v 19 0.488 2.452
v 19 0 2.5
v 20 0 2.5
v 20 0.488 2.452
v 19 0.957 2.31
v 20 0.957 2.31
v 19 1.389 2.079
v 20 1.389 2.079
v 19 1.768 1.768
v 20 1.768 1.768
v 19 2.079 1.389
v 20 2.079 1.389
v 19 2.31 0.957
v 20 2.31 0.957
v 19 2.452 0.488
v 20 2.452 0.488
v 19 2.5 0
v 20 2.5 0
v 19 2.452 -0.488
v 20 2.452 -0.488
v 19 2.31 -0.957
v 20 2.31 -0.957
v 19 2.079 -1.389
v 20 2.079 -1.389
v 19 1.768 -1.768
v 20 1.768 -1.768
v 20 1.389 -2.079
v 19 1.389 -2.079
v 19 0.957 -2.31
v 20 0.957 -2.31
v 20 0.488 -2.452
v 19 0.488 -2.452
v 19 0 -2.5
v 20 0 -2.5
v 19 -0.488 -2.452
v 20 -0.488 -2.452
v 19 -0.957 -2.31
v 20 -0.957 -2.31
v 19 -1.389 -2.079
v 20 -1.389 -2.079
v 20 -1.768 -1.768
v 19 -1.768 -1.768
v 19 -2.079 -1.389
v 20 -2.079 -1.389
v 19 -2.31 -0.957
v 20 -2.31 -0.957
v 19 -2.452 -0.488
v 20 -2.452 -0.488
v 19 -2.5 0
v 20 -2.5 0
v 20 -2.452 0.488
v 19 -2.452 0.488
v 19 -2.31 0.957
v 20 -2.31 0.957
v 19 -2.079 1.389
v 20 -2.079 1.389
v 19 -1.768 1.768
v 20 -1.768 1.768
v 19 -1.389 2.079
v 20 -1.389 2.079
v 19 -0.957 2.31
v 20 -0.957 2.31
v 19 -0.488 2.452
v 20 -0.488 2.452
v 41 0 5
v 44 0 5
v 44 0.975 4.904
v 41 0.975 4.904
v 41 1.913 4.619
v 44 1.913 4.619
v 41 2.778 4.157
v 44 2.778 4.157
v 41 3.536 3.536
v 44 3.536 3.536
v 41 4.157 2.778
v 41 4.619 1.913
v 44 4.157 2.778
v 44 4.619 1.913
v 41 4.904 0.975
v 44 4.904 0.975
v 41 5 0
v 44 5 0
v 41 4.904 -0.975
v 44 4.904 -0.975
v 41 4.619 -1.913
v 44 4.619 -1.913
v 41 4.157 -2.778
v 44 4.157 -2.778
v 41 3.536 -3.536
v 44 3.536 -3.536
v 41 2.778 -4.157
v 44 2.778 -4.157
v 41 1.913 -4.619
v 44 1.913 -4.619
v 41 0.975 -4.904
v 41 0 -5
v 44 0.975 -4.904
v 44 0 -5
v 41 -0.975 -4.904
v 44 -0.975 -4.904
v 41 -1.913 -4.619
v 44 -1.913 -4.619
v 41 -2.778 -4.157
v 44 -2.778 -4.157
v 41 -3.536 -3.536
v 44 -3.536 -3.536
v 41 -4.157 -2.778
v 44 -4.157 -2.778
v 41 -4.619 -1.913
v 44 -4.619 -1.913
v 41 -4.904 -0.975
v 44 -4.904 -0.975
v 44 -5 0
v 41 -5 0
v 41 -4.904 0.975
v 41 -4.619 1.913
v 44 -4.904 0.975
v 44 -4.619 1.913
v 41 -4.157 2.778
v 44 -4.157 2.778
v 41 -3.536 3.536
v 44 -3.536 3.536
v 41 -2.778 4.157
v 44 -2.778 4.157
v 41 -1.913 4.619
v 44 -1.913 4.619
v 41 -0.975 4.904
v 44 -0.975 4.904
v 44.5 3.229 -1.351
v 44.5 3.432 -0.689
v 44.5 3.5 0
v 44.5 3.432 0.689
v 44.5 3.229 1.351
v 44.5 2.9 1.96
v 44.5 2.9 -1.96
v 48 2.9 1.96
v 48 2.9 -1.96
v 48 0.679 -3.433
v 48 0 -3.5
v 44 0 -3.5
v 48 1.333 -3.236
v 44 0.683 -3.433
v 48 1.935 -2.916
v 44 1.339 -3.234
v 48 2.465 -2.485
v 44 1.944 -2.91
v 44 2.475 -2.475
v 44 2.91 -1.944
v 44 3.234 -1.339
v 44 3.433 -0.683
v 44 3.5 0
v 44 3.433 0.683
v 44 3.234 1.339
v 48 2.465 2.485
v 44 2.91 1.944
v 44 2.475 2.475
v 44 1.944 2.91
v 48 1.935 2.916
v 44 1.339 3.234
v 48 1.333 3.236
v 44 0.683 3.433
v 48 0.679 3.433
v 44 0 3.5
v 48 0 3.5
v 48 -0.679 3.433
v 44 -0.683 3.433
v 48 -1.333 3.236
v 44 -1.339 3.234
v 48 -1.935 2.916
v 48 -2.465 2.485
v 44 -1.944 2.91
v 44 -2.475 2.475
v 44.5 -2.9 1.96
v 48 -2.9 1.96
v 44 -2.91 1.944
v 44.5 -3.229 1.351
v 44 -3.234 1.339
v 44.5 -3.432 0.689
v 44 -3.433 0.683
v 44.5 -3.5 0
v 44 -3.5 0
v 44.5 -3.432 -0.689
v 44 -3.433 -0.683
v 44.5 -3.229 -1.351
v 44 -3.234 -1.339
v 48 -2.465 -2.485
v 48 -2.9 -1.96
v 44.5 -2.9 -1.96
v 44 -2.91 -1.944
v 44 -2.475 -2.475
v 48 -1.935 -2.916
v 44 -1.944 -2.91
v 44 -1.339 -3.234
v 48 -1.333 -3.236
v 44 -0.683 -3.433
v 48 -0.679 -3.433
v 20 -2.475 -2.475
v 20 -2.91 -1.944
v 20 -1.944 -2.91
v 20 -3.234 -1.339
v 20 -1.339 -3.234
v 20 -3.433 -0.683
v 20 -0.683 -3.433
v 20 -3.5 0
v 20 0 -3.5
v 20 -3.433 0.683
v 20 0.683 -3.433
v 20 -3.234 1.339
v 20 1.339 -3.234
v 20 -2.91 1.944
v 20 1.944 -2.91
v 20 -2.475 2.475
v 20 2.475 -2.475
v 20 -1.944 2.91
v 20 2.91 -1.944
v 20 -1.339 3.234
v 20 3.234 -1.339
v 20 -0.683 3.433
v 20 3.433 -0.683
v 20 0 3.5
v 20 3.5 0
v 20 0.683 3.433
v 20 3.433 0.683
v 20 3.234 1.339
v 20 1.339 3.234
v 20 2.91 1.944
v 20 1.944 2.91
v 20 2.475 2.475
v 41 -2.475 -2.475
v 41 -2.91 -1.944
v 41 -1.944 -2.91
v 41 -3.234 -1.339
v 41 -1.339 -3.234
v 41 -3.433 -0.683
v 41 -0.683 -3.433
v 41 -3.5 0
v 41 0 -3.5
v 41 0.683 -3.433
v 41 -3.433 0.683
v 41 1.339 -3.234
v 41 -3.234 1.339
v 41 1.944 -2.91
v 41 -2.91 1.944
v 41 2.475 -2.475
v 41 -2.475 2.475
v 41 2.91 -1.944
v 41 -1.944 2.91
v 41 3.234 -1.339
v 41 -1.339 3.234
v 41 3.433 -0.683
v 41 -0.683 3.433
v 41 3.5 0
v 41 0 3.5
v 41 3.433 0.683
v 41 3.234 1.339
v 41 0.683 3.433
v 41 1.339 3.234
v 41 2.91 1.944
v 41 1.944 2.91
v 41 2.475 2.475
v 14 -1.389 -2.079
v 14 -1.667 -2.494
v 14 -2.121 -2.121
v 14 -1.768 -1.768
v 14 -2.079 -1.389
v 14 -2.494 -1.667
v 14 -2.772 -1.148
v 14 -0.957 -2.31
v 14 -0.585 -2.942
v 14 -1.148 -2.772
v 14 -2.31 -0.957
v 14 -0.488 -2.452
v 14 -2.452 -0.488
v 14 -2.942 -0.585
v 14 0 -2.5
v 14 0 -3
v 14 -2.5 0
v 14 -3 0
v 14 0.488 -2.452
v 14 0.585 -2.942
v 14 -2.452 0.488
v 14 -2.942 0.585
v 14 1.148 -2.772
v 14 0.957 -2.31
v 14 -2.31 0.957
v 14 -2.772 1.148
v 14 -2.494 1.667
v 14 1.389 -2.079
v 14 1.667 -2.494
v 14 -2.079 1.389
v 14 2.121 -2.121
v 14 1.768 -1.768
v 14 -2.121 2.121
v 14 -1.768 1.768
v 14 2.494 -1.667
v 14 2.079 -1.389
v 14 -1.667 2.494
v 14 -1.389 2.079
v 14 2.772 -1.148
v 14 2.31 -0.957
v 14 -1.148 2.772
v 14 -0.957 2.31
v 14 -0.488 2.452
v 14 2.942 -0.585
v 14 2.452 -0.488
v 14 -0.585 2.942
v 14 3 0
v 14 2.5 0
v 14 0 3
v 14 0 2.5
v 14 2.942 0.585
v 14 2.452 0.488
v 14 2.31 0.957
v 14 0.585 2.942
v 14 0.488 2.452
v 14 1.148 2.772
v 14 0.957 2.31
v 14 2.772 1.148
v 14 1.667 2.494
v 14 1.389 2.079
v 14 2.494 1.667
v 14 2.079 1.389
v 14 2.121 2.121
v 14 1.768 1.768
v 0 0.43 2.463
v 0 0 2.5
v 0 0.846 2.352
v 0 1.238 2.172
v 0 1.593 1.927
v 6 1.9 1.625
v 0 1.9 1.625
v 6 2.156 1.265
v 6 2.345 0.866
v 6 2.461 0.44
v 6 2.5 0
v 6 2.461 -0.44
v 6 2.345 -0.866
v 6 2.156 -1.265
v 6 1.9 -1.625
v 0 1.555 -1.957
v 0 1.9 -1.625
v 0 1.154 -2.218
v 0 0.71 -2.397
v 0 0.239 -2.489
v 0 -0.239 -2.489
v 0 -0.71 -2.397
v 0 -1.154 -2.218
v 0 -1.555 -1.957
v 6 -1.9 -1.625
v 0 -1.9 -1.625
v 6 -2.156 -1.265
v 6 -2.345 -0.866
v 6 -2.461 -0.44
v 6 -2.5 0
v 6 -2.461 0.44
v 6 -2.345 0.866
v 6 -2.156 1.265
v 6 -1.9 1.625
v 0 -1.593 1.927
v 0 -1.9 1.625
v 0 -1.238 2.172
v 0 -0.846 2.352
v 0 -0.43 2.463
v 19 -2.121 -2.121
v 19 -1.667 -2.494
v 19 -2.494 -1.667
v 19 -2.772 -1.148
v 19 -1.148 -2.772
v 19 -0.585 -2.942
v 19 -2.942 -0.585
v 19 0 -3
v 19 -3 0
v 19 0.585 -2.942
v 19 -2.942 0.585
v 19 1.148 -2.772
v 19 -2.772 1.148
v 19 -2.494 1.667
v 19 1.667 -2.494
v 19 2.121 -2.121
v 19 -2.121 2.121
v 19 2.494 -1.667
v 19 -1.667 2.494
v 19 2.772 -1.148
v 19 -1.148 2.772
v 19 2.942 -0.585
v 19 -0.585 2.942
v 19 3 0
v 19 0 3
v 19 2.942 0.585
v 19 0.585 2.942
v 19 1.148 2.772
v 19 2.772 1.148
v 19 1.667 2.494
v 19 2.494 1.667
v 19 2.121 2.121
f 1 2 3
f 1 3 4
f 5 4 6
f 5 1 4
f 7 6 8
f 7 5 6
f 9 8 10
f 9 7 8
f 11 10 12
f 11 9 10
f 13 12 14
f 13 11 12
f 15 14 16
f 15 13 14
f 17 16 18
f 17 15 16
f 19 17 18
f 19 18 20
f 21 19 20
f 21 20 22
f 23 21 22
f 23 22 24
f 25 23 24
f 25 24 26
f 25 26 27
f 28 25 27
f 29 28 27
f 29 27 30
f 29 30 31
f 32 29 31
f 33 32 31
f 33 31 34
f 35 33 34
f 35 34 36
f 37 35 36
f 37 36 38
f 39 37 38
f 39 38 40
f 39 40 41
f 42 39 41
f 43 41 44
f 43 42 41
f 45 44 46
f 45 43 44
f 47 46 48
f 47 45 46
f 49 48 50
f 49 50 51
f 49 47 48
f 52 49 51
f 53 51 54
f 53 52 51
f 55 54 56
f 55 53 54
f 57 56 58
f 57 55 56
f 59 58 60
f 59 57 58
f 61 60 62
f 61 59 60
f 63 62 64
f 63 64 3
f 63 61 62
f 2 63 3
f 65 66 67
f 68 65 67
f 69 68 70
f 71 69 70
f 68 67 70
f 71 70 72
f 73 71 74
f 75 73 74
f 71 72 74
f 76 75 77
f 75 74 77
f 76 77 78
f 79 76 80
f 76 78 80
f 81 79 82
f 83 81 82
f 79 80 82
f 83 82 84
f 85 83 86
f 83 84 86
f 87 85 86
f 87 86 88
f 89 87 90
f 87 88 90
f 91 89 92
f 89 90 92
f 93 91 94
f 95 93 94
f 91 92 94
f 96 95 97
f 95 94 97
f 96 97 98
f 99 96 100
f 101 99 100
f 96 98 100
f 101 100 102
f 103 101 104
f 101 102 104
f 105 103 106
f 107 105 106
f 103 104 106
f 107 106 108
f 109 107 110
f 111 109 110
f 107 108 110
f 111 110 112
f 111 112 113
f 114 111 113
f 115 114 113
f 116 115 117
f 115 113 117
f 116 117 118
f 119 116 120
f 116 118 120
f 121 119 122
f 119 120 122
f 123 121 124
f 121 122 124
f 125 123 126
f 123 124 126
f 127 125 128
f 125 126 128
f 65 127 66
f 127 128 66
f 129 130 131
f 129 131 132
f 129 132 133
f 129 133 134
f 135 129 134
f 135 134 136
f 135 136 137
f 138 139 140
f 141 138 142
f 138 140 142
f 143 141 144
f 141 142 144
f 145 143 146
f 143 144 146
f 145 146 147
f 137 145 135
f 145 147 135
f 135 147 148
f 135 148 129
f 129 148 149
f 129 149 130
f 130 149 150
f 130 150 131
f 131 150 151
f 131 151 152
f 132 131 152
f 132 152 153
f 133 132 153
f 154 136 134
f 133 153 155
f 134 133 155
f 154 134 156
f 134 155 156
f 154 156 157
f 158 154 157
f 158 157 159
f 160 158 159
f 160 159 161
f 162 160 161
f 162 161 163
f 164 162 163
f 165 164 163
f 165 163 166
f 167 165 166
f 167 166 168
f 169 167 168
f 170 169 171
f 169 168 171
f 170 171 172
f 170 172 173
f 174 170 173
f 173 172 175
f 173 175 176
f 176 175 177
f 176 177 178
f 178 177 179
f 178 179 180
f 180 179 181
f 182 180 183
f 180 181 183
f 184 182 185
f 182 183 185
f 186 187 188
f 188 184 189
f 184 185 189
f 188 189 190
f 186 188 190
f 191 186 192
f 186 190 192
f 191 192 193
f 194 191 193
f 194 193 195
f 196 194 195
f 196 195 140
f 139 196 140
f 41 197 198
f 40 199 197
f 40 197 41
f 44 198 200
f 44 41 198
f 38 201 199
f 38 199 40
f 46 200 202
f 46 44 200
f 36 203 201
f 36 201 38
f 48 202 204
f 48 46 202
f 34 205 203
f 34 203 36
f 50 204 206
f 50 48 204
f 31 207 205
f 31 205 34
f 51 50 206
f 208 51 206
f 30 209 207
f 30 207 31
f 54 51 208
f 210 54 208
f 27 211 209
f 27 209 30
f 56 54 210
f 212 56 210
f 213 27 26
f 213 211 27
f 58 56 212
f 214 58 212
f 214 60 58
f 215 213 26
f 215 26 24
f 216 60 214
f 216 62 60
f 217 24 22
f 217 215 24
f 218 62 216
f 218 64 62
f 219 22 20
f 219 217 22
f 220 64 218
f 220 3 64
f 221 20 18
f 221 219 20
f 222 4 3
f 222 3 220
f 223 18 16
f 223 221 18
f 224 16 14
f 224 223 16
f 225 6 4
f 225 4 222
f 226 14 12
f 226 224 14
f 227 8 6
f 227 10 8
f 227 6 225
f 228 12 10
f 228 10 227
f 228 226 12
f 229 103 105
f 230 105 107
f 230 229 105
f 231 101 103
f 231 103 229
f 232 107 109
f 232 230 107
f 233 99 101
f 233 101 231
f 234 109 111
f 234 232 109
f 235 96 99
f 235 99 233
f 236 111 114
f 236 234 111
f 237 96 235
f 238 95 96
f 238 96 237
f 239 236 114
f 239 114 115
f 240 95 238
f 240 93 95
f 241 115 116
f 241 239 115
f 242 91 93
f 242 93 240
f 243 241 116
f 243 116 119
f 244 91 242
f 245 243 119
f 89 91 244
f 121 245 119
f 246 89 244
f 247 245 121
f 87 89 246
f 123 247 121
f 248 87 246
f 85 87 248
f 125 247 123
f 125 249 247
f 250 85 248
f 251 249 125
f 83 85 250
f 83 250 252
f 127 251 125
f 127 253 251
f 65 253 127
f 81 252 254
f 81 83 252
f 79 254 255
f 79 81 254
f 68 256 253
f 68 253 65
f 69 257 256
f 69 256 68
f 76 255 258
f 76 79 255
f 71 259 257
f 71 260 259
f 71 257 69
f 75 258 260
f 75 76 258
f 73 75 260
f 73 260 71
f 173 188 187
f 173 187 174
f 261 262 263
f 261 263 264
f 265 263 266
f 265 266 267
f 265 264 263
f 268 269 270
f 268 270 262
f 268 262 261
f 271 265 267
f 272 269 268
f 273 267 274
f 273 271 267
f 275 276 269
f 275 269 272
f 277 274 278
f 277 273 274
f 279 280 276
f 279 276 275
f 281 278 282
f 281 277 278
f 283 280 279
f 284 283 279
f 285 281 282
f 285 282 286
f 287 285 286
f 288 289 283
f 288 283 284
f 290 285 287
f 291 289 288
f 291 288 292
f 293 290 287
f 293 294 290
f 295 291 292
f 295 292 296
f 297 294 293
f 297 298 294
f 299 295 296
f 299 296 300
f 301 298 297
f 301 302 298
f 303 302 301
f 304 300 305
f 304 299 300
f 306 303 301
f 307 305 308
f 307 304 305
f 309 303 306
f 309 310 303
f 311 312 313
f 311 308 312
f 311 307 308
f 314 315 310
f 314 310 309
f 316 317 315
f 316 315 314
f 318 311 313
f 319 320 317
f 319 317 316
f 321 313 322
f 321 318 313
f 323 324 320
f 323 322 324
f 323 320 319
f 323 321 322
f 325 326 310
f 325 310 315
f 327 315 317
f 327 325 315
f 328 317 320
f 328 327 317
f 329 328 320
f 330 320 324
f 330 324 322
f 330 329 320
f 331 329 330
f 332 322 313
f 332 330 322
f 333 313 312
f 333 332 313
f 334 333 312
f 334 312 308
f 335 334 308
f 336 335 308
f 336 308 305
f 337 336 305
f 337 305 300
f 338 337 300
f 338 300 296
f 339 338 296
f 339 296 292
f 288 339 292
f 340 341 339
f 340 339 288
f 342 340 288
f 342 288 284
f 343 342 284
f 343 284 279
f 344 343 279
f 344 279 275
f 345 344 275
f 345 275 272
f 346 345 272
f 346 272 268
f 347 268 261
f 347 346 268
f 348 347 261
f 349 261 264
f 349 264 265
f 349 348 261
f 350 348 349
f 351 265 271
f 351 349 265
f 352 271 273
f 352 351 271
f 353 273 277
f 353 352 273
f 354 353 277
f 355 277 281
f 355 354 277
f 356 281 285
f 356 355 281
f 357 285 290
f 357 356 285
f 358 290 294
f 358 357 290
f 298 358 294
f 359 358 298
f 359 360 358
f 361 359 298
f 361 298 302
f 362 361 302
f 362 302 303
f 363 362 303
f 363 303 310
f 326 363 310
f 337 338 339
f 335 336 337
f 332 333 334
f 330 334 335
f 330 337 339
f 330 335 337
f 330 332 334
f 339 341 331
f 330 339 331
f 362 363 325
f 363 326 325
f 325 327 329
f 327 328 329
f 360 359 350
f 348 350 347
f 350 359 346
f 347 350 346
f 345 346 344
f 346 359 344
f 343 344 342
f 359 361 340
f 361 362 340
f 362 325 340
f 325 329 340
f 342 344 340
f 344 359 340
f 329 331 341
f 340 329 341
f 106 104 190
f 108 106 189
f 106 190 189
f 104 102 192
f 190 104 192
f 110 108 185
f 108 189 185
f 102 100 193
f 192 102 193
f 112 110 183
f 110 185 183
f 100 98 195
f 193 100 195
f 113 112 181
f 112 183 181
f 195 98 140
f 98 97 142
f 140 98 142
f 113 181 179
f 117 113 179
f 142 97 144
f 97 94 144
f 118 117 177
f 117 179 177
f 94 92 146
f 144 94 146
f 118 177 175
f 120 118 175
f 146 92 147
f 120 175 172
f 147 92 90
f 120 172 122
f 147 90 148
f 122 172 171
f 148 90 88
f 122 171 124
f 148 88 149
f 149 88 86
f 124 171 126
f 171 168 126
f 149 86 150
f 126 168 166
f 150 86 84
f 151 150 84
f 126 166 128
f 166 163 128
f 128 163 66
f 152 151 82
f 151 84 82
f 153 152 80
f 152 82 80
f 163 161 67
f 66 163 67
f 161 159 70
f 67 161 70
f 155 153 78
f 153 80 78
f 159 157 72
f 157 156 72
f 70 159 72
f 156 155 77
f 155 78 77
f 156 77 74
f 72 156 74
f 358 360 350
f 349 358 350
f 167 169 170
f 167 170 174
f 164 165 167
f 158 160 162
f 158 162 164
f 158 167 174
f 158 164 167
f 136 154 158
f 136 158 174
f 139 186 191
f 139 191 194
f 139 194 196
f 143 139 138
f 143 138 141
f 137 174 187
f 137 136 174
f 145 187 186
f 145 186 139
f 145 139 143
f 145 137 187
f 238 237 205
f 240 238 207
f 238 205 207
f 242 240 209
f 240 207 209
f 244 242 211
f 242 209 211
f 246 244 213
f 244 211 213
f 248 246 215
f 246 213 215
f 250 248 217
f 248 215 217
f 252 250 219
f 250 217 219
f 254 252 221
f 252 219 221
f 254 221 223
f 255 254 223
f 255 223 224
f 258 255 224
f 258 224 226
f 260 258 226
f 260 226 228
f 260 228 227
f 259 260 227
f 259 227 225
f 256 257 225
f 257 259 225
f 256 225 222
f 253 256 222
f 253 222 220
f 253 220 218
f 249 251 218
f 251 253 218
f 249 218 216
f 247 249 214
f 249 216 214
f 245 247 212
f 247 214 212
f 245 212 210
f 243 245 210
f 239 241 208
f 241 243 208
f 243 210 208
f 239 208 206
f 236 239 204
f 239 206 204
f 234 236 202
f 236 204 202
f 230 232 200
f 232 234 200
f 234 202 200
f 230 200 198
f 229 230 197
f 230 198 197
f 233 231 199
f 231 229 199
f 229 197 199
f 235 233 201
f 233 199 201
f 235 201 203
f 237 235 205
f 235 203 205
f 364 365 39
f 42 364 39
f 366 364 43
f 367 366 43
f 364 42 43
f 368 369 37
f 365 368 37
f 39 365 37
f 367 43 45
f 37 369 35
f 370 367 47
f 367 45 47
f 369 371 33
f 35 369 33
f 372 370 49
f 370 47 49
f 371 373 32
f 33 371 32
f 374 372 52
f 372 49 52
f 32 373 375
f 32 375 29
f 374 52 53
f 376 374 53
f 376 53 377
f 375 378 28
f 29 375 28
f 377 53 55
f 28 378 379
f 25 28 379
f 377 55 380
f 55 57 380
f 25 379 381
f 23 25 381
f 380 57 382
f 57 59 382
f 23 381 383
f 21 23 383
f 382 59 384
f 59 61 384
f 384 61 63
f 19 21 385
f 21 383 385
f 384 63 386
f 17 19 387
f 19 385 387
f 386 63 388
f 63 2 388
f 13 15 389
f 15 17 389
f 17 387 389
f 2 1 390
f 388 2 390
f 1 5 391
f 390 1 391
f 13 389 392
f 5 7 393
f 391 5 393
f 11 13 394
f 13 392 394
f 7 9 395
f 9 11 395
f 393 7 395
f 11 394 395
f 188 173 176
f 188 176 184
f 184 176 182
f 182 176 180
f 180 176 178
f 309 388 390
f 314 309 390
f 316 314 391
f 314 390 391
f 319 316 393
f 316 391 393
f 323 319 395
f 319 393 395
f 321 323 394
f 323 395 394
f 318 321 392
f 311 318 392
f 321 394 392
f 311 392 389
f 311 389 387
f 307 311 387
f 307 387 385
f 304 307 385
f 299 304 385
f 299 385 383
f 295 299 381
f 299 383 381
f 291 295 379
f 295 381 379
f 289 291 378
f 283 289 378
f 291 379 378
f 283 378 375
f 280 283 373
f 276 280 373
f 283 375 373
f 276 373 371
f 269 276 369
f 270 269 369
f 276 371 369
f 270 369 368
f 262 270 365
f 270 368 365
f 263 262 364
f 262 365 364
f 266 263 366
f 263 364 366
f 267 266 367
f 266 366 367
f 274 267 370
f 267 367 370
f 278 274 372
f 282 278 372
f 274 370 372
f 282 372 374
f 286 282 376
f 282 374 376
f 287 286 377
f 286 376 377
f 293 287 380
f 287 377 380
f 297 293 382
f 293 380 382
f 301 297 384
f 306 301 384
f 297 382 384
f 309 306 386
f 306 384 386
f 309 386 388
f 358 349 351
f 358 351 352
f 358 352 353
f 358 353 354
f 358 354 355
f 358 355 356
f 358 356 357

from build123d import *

# Parameters (mm, degrees)
SKETCH1_R           = 3.5
BOSS_EXTRUDE1_DEPTH = 50
BOSS_EXTRUDE2_START = 6
SKETCH2_R           = 5
BOSS_EXTRUDE2_DEPTH = 3
SKETCH5_R           = 3.5
SKETCH5_R_2         = 2.5
CUT_EXTRUDE2_DEPTH  = 20
BOSS_EXTRUDE3_START = 22
SKETCH3_R           = 3
BOSS_EXTRUDE3_DEPTH = 5
CUT_EXTRUDE3_START  = -5.5
CUT_EXTRUDE3_DEPTH  = 5.5
CUT_EXTRUDE4_START  = -2
CUT_EXTRUDE4_DEPTH  = 2
CUT_EXTRUDE5_DEPTH  = 6


with BuildPart() as part:
    # Sketch1 → Boss-Extrude1 (new body)
    with BuildSketch(Plane(origin=(0, 0, 0), x_dir=(0, 0, -1), z_dir=(1, 0, 0))):
        Circle(SKETCH1_R)
    extrude(amount=BOSS_EXTRUDE1_DEPTH)

    # Sketch2 → Boss-Extrude2 (add)
    with BuildSketch(Plane.ZY.offset(-50).offset(BOSS_EXTRUDE2_START)):
        Circle(SKETCH2_R)
    extrude(amount=BOSS_EXTRUDE2_DEPTH)

    # Sketch5 → Cut-Extrude2 (cut)
    with BuildSketch(Plane.ZY):
        Circle(SKETCH5_R)
        Circle(SKETCH5_R_2, mode=Mode.SUBTRACT)
    extrude(amount=-CUT_EXTRUDE2_DEPTH, mode=Mode.SUBTRACT)

    # Sketch3 → Boss-Extrude3 (add)
    with BuildSketch(Plane.ZY.offset(-41).offset(BOSS_EXTRUDE3_START)):
        Circle(SKETCH3_R)
    extrude(amount=BOSS_EXTRUDE3_DEPTH)

    # Sketch6 → Cut-Extrude3 (cut)
    with BuildSketch(Plane(origin=(50, 0, 0), x_dir=(0, 0, -1), z_dir=(1, 0, 0)).offset(CUT_EXTRUDE3_START)):
        with BuildLine():
            ThreePointArc((1.959591794, 2.9), (0, 3.5), (-1.959591794, 2.9))
            Line((-1.959591794, 2.9), (1.959591794, 2.9))
        make_face()
        with BuildLine():
            Line((1.959591794, -2.9), (-1.959591794, -2.9))
            ThreePointArc((-1.959591794, -2.9), (0, -3.5), (1.959591794, -2.9))
        make_face()
    extrude(amount=CUT_EXTRUDE3_DEPTH, mode=Mode.SUBTRACT)

    # Sketch7 → Cut-Extrude4 (cut)
    with BuildSketch(Plane(origin=(50, 0, 0), x_dir=(0, 0, -1), z_dir=(1, 0, 0)).offset(CUT_EXTRUDE4_START)):
        with BuildLine():
            Line((1.959591794, 2.9), (-1.959591794, 2.9))
            ThreePointArc((-1.959591794, 2.9), (-3.5, 0), (-1.959591794, -2.9))
            Line((-1.959591794, -2.9), (1.959591794, -2.9))
            ThreePointArc((1.959591794, -2.9), (3.5, 0), (1.959591794, 2.9))
        make_face()
    extrude(amount=CUT_EXTRUDE4_DEPTH, mode=Mode.SUBTRACT)

    # Sketch8 → Cut-Extrude5 (cut)
    with BuildSketch(Plane.ZY):
        with BuildLine():
            ThreePointArc((1.624807681, 1.9), (0, 2.5), (-1.624807681, 1.9))
            Line((-1.624807681, 1.9), (1.624807681, 1.9))
        make_face()
        with BuildLine():
            Line((1.624807681, -1.9), (-1.624807681, -1.9))
            ThreePointArc((-1.624807681, -1.9), (0, -2.5), (1.624807681, -1.9))
        make_face()
    extrude(amount=-CUT_EXTRUDE5_DEPTH, mode=Mode.SUBTRACT)


solid = part.part
